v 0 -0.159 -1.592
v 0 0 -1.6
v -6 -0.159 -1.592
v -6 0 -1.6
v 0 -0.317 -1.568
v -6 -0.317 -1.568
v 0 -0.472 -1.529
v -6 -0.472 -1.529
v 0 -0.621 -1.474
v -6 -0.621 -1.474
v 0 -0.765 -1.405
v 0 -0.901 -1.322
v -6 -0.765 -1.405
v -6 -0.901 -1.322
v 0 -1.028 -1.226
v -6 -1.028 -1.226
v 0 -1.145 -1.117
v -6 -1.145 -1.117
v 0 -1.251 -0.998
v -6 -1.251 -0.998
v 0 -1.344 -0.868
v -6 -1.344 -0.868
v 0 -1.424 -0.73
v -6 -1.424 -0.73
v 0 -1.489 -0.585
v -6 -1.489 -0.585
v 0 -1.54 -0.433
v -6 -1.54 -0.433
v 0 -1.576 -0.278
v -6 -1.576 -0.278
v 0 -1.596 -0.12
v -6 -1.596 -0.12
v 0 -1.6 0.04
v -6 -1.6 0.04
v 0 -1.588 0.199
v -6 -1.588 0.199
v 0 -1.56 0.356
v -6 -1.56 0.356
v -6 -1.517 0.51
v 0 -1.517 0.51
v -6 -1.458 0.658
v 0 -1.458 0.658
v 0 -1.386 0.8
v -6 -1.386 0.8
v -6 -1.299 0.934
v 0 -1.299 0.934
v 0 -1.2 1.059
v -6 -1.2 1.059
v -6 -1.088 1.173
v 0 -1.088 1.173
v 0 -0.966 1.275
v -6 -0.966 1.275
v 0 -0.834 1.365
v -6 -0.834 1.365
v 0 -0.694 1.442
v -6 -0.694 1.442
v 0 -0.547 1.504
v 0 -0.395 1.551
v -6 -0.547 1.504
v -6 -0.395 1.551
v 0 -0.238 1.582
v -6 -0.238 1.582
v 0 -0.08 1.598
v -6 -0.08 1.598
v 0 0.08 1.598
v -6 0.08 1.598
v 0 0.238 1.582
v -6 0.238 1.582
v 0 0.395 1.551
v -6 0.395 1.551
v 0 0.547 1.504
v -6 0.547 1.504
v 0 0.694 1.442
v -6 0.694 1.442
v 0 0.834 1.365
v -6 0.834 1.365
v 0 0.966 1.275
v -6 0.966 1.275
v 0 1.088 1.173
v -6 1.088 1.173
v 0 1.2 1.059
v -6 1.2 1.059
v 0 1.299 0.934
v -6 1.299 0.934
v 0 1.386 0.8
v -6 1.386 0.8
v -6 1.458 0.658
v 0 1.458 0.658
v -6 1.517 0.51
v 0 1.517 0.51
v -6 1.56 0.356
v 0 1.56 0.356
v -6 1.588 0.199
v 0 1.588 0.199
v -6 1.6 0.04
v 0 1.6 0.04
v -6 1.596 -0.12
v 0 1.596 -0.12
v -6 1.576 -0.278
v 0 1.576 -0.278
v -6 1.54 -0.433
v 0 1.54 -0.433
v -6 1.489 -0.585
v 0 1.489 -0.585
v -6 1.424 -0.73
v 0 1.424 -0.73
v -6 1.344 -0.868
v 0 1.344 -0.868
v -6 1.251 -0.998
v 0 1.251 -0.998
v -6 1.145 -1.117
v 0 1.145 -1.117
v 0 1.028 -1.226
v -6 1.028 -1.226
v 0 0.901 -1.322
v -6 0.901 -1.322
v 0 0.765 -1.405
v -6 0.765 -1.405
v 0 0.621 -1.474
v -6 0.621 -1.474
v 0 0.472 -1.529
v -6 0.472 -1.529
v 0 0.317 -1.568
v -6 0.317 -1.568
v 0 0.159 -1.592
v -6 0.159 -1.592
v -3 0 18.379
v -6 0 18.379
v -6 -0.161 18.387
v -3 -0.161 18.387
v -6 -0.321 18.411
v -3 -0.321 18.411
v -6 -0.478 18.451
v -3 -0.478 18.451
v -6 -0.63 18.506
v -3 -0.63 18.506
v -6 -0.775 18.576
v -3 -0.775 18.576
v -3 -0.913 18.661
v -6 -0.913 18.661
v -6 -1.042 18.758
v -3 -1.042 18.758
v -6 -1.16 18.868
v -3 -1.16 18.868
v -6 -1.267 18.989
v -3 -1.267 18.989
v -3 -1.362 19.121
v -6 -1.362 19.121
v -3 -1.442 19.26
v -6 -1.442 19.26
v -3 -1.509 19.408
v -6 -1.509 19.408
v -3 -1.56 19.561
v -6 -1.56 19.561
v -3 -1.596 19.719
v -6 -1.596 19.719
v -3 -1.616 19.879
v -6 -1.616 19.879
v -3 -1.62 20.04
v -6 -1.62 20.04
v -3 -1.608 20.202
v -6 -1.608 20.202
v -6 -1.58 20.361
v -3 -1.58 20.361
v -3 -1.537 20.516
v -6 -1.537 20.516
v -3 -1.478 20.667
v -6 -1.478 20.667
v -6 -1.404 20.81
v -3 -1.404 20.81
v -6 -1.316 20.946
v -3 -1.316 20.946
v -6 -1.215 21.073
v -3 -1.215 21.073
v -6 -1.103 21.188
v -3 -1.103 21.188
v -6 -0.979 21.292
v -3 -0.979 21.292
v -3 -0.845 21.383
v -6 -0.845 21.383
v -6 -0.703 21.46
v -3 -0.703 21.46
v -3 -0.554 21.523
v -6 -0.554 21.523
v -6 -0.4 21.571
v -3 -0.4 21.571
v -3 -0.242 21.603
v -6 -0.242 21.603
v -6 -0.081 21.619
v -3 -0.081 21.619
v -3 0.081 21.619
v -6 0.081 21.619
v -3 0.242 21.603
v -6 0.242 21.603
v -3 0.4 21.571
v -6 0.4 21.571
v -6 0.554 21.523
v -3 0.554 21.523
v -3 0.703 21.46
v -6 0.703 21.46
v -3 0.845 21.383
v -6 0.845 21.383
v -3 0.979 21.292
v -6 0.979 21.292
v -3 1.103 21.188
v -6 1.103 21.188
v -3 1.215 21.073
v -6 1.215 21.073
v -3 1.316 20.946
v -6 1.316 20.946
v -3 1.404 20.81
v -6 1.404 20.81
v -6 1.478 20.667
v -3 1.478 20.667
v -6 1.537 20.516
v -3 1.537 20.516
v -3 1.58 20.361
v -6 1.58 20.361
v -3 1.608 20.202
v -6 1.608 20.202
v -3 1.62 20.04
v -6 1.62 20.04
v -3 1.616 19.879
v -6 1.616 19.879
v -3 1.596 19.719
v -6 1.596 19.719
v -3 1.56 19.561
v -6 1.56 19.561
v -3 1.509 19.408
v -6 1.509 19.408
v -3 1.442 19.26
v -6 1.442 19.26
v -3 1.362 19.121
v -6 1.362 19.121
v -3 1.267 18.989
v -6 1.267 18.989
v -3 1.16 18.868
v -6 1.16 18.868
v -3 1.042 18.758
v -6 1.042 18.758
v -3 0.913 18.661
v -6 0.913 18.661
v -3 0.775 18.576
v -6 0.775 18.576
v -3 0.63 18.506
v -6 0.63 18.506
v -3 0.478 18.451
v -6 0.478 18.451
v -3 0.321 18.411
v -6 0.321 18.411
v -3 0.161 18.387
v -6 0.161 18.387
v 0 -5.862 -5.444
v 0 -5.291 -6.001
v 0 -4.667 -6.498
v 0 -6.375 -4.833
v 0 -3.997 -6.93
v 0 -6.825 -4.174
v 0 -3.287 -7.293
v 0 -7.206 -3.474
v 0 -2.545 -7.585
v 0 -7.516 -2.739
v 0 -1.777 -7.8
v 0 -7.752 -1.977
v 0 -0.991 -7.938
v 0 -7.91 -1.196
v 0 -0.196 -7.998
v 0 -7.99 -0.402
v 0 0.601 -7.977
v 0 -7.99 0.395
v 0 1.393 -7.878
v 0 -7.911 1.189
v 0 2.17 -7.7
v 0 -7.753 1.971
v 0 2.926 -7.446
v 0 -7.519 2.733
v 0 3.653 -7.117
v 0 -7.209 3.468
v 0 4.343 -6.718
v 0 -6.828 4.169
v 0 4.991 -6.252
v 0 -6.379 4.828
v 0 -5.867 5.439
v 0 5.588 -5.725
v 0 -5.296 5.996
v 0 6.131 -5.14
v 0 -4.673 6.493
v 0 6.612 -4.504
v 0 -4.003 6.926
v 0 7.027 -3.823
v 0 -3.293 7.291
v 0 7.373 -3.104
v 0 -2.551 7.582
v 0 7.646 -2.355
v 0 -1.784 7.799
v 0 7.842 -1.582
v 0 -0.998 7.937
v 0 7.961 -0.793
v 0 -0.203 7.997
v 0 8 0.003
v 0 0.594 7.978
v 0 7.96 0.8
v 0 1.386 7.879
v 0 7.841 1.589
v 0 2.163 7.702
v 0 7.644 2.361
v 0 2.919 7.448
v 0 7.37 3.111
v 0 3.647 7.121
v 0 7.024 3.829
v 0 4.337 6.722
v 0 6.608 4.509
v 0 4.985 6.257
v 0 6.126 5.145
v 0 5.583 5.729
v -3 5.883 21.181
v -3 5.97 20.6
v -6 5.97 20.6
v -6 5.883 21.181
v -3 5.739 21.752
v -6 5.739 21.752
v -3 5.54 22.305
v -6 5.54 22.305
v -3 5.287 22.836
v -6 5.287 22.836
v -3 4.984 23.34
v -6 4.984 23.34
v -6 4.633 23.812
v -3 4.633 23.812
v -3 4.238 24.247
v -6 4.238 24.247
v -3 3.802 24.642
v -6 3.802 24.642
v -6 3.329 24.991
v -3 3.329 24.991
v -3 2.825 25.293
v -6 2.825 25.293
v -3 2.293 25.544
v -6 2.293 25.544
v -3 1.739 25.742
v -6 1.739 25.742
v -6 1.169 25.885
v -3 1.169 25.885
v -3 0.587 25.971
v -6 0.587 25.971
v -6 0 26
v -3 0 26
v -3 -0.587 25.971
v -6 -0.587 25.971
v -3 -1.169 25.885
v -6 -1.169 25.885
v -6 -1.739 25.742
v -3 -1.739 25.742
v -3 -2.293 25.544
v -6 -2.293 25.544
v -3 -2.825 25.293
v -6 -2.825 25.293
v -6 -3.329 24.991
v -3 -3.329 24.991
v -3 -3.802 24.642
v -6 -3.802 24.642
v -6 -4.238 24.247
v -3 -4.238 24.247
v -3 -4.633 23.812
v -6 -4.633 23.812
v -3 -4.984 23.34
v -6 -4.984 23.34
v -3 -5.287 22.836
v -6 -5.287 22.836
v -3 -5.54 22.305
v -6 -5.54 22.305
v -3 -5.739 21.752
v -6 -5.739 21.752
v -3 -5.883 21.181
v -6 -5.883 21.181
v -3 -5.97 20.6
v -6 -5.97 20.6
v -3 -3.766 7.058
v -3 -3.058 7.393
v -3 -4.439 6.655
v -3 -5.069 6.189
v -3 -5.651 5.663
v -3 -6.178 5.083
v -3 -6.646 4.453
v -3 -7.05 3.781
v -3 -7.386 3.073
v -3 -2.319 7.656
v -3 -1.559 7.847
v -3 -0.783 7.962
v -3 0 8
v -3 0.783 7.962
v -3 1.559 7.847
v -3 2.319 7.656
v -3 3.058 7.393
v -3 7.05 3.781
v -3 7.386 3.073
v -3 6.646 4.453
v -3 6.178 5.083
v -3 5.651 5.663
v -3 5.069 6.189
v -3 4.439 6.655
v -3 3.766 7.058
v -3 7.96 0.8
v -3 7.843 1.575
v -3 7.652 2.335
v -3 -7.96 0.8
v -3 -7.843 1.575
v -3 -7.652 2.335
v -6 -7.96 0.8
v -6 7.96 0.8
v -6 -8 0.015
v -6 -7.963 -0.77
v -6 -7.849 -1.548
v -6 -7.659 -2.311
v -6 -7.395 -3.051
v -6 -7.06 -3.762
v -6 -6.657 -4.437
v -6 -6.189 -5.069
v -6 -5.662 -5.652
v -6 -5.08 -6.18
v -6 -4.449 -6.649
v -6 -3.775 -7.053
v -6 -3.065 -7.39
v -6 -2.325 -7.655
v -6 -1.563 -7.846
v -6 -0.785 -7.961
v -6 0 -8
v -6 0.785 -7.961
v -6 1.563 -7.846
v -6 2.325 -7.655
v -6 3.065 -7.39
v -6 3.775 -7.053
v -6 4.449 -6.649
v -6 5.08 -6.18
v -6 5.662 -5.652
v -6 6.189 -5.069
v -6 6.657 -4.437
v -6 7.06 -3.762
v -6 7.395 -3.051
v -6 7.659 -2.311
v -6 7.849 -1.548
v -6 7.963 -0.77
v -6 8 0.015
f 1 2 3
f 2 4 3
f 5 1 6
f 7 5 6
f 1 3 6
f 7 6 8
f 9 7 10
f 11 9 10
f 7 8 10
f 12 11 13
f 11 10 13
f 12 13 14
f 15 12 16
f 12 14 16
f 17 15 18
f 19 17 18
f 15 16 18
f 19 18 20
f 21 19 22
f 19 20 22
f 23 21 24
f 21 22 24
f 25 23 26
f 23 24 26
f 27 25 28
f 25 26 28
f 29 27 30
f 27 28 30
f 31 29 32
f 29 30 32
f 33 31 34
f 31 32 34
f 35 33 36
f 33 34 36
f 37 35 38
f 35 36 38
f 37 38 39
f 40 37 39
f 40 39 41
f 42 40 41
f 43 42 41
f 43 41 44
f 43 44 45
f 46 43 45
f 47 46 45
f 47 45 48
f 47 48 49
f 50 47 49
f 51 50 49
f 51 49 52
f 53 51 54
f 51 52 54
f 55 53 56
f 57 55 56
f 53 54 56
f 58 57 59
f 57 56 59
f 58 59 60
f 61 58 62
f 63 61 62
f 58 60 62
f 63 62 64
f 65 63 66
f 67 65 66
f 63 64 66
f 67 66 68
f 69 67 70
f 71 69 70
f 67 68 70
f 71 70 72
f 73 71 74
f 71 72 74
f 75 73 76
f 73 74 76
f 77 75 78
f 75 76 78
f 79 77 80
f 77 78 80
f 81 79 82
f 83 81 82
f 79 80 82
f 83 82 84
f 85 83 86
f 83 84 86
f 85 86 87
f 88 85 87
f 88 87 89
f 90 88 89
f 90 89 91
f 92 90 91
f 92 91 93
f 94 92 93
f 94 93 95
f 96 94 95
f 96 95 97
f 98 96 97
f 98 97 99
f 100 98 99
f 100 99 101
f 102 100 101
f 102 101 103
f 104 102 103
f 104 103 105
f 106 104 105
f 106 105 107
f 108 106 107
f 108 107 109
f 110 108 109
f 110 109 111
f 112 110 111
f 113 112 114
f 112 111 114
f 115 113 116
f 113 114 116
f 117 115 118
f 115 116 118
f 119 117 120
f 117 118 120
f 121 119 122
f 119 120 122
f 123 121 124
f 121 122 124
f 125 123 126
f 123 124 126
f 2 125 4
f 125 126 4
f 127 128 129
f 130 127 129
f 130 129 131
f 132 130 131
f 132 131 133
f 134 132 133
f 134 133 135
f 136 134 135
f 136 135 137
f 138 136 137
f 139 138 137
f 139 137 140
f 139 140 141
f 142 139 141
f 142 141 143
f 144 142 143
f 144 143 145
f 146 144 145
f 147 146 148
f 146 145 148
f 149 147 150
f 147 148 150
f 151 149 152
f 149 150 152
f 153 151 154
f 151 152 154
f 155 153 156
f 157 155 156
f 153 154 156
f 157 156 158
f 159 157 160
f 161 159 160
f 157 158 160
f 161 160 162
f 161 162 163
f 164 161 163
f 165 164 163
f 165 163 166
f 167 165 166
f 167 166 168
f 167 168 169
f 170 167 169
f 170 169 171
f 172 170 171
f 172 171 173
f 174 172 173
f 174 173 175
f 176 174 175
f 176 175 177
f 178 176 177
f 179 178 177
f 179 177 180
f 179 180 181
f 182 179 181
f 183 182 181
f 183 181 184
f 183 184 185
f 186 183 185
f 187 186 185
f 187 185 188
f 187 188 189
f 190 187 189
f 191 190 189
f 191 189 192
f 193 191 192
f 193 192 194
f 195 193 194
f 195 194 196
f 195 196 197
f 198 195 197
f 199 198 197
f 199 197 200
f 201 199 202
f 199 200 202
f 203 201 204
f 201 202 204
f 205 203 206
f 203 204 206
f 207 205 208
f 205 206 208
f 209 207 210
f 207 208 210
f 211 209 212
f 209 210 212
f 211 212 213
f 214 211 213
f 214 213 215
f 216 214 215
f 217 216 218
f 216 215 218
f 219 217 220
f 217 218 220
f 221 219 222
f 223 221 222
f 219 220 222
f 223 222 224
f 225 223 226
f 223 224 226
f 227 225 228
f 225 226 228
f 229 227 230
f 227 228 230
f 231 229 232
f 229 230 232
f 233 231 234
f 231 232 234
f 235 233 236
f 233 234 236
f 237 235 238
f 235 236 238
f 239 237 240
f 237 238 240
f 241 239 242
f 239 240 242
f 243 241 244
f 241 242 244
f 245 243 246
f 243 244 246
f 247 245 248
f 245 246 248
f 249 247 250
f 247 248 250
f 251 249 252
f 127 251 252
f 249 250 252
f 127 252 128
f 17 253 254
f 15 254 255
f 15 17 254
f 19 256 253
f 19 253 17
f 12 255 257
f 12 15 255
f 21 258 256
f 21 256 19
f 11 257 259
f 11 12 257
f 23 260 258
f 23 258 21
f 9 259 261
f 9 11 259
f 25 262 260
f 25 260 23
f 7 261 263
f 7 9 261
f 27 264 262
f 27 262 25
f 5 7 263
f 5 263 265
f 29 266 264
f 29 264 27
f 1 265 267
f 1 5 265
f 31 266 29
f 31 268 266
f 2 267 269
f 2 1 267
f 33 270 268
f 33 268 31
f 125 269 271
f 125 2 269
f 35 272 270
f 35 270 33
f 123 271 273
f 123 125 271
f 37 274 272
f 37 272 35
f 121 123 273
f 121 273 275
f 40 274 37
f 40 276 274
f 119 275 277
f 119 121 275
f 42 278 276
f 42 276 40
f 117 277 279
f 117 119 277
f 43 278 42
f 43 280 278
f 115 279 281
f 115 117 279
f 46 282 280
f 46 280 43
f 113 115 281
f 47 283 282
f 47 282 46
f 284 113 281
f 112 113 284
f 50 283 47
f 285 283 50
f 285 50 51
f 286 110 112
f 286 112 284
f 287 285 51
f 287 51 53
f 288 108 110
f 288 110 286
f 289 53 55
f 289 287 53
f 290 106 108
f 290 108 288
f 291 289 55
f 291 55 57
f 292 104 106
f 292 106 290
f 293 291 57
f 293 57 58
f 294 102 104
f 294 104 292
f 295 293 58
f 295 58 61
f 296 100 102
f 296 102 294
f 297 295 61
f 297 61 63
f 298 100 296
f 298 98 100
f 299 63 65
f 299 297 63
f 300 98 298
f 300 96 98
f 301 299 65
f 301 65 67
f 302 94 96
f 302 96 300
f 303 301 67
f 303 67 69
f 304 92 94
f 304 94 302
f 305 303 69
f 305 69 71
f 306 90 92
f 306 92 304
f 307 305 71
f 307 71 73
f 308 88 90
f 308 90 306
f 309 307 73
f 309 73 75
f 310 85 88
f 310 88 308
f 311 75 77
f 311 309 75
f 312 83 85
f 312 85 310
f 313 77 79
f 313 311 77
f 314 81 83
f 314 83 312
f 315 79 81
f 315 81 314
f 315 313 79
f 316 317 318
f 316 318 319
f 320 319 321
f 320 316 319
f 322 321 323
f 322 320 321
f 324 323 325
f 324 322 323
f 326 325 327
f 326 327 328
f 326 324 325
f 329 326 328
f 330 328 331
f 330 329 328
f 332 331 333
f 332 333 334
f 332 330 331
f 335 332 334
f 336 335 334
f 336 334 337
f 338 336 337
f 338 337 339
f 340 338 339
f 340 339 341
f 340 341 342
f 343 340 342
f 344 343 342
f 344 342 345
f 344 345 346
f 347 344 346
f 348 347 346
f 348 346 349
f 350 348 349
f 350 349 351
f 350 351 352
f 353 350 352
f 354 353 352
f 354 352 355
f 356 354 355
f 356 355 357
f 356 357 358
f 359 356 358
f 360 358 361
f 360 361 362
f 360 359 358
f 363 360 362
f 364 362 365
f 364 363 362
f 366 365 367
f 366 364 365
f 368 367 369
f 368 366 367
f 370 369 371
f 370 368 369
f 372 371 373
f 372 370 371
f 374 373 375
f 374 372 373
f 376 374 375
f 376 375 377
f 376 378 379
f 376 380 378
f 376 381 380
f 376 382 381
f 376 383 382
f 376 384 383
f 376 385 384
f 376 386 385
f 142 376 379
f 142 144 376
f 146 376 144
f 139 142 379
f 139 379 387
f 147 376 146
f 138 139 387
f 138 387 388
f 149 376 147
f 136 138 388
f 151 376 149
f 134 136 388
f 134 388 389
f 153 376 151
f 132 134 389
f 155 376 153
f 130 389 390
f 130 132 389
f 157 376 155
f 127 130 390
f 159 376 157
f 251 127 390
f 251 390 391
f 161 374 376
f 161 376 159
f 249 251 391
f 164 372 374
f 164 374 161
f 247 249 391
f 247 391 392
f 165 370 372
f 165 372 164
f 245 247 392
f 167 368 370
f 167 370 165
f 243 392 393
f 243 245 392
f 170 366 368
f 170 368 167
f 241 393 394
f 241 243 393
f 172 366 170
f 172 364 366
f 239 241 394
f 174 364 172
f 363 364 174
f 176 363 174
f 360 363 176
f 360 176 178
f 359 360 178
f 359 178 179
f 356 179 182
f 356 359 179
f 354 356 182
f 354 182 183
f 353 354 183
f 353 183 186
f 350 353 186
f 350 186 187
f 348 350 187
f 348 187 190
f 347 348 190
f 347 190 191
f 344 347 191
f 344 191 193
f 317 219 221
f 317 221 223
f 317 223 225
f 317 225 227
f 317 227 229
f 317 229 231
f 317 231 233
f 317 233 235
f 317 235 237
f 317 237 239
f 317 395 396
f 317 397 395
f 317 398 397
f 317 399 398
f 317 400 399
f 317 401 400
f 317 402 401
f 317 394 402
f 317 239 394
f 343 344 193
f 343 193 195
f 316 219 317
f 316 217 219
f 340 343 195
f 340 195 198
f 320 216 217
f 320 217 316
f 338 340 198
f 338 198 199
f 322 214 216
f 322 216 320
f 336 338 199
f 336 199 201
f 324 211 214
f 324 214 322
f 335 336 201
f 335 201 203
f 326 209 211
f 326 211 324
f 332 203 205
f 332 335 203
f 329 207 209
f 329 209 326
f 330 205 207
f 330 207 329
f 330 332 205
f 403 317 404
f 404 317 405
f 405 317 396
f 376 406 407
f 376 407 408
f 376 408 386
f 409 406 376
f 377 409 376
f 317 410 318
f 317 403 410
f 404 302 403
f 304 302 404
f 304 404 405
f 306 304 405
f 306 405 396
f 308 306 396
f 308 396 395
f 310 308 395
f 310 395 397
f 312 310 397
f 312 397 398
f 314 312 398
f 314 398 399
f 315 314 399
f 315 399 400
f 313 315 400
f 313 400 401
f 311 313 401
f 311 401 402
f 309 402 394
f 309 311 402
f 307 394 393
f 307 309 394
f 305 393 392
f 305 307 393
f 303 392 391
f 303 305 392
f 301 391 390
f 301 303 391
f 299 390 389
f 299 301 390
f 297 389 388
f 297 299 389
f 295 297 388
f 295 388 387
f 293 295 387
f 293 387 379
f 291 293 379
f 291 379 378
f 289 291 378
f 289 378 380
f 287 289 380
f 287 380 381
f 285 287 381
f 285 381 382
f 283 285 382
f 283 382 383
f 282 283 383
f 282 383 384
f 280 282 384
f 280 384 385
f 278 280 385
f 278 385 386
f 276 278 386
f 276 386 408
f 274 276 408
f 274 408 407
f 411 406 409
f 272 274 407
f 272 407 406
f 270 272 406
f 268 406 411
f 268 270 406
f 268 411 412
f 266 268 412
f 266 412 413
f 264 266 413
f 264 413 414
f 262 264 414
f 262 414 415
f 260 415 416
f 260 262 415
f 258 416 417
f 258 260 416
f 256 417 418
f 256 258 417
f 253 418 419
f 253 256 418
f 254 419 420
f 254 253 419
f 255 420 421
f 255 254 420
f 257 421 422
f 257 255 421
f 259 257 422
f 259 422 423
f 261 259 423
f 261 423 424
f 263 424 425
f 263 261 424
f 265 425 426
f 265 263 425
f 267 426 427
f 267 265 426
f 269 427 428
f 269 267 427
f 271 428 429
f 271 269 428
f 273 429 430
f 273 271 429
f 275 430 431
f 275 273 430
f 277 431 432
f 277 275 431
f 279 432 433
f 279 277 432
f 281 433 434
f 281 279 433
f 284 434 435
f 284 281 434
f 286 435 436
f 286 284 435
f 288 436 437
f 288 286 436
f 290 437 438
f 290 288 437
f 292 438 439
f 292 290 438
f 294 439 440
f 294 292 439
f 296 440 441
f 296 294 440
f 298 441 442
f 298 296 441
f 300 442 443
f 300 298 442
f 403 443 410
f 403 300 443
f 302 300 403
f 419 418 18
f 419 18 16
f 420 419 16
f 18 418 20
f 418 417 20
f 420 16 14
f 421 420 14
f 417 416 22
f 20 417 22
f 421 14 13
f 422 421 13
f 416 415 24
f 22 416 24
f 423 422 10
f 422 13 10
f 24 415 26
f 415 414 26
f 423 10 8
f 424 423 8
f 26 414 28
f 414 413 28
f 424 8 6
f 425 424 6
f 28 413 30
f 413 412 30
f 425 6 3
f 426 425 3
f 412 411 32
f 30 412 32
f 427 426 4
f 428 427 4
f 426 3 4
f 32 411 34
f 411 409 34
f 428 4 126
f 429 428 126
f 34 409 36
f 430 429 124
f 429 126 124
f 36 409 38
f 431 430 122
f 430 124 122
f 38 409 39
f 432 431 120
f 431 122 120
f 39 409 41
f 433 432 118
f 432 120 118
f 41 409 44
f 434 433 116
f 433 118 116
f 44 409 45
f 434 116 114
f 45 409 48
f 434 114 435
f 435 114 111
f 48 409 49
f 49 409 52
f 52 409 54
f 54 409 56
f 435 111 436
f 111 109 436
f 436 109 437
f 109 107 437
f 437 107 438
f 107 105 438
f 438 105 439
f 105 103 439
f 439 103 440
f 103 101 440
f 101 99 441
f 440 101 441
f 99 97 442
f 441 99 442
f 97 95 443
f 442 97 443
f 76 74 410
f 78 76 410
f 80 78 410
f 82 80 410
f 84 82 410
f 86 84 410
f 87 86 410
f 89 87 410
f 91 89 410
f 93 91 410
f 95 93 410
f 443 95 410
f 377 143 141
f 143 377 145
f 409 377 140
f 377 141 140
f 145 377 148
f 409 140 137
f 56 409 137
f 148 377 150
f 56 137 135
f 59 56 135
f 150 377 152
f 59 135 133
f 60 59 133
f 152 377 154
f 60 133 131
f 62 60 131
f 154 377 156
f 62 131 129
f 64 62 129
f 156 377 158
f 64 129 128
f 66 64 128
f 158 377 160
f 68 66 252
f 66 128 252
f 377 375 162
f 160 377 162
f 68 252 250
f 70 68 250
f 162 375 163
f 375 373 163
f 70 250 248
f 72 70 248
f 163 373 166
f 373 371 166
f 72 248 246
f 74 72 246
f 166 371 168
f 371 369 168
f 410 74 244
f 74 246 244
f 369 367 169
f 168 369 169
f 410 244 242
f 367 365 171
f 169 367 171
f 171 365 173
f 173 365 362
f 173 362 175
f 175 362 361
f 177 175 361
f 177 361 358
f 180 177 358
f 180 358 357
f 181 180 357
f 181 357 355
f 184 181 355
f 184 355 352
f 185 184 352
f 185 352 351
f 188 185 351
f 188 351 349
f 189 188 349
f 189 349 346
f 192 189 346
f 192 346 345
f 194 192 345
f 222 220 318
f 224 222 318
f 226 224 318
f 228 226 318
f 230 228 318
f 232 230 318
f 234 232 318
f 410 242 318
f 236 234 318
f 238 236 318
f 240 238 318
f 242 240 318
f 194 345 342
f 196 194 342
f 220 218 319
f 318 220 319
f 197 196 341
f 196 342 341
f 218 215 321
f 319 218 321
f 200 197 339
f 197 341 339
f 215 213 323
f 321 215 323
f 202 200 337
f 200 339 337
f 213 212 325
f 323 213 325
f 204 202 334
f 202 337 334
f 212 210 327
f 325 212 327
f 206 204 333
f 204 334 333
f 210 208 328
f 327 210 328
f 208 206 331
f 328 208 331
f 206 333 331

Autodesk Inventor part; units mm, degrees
ref_plane "YZ Plane" through (0, 0, 0) normal (1, 0, 0) x (0, 1, 0)
ref_plane "XZ Plane" through (0, 0, 0) normal (0, 1, 0) x (-1, 0, 0)
ref_plane "XY Plane" through (0, 0, 0) normal (0, 0, 1) x (1, 0, 0)
sketch "Sketch1" plane through (0, 0, 0) normal (1, 0, 0) x (0, 1, 0)
  circle A0 centre (0, 0) radius 8
  line L0 (0, 20) -> (0, 0) construction
  arc A1 (5.9699, 20.6) -> (-5.9699, 20.6) centre (0, 20) ccw
  line L1 (-7.9599, 0.8) -> (-5.9699, 20.6)
  line L2 (7.9599, 0.8) -> (5.9699, 20.6)
  line L3 (-5.3312, 5.9647) -> (7.8312, -1.6346) construction
  line L4 (5.3312, -5.9647) -> (-7.8312, 1.6346) construction
  line L5 (-6.9282, 4) -> (6.9282, -4) construction
  line L6 (-5.3116, 5.9823) -> (7.8366, -1.6088)
  line L7 (-7.8366, 1.6088) -> (5.3116, -5.9823)
  line L8 (5.3312, 5.9647) -> (-7.8312, -1.6346) construction
  line L9 (-5.3312, -5.9647) -> (7.8312, 1.6346) construction
  line L10 (6.9282, 4) -> (-6.9282, -4) construction
  line L11 (5.3116, 5.9823) -> (-7.8366, -1.6088)
  line L12 (7.8366, 1.6088) -> (-5.3116, -5.9823)
  line L13 (-7.5911, 2.525) -> (7.5911, 2.525)
  line L14 (-7.5993, 2.5) -> (7.5993, 2.5) construction
  line L15 (-8, 0) -> (8, 0) construction
  line L16 (-7.5911, -2.525) -> (7.5911, -2.525)
  line L17 (-7.5993, -2.5) -> (7.5993, -2.5) construction
  point P0 (7.9599, 0.8)
  point P1 (-5.3116, -5.9823)
  point P2 (0, -2.9156)
  point P3 (5.3116, -5.9823)
  point P4 (5.05, 0)
  point P5 (7.8366, 1.6088)
  point P6 (5.3116, 5.9823)
  point P7 (0, 2.9156)
  point P8 (-7.8366, 1.6088)
  point P9 (-5.05, 0)
  point P10 (-7.8366, -1.6088)
  dimension "d0" = 16
  dimension "d1" = 20
  dimension "d2" = 12
  dimension "d28" = 60
  dimension "d29" = 5
  dimension "d30" = 0.025
  dimension "d31" = 5
  dimension "d32" = 0.025
extrude "Extrusion1" add sketch "Sketch1" against normal blind 6
extrude "Extrusion2" cut sketch "Sketch1" against normal blind 3 contours A0 L1 A1 L2
hole "M4" at (0, 0, 20) direction (-1, 0, 0) diameter 3.242 end through all thread size "M4x0.7" class "6H" standard "ANSI Metric M Profile"
hole "Phi3.2" at (0, 0, 0) direction (-1, 0, 0) diameter 3.2 end through all
equation "\"d31\" = d29"
equation "\"d32\" = d30"
properties part number "LongCrankFrameBasis" material "Aluminum 7075"
